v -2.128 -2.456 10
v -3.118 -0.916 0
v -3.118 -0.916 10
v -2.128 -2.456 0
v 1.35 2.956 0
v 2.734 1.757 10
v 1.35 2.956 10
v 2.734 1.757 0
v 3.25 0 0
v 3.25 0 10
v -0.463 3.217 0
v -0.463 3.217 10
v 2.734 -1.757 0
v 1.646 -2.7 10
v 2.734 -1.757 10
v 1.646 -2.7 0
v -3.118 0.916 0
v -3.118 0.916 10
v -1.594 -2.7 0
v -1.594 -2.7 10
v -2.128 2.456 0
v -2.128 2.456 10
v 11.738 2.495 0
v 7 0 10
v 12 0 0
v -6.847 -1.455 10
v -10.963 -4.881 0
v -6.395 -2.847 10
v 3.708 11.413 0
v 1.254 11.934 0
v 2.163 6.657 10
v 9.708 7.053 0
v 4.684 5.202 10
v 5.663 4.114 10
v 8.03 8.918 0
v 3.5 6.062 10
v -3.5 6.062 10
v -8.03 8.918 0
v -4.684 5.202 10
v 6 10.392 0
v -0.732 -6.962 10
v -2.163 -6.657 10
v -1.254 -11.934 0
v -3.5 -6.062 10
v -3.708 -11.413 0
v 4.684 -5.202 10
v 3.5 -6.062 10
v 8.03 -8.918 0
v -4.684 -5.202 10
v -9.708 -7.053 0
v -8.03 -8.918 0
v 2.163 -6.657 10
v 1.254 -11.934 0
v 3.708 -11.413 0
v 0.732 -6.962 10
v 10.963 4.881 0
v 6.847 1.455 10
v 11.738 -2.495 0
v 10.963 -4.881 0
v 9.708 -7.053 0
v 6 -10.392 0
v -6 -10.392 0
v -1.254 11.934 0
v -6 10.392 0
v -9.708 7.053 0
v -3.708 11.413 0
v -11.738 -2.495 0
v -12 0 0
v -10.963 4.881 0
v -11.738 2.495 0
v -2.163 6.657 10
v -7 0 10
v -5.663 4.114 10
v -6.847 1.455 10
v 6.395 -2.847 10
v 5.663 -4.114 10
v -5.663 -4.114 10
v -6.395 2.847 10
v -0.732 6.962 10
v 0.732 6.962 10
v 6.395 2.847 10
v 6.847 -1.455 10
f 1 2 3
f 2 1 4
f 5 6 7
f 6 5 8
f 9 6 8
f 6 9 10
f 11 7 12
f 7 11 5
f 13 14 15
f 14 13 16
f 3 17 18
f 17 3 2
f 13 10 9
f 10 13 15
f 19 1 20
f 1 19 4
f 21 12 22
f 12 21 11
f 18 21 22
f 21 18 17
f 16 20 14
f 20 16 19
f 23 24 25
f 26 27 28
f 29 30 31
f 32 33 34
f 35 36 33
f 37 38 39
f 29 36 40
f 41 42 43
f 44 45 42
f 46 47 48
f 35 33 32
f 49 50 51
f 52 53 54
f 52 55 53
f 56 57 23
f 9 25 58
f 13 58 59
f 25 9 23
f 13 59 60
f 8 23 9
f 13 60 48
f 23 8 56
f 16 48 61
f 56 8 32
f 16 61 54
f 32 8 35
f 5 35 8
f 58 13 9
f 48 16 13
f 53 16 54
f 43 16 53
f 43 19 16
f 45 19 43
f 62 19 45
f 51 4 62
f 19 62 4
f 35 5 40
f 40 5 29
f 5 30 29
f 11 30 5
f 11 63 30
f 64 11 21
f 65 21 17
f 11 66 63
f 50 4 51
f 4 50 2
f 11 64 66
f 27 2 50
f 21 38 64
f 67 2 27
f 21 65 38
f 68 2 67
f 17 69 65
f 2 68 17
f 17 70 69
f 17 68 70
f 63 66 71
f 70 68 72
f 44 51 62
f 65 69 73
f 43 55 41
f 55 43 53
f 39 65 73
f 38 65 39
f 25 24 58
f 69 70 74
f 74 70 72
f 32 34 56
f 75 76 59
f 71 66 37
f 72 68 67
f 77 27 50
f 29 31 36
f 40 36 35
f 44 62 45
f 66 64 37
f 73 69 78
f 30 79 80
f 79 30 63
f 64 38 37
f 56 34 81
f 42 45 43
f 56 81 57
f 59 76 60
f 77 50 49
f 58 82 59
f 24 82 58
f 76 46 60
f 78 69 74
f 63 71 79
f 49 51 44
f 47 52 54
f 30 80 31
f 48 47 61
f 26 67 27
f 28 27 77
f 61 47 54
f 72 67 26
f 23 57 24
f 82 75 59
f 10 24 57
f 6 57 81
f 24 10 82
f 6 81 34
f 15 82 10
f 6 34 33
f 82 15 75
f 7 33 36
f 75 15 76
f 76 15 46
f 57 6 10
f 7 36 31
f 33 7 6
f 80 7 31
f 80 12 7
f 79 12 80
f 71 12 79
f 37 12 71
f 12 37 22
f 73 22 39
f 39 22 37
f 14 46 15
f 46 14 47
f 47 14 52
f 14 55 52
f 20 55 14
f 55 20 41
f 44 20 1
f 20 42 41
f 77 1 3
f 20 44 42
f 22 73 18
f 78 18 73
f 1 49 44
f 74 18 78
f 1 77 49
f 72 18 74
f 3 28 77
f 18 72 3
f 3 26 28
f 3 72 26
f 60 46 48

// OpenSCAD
//FABSCAN TURN TABLE MOTOR MOUNT
//JACK TAYLOR 2016

module motorshaft(height,diam,flatdiam)
{
    rd = diam/2;
    difference()
    {
    color("blue")
    cylinder(r=rd,h=height);
    color("pink")
    translate([-rd,-rd-flatdiam,-1])
    cube([diam,diam,height+2]);
    }
}

//motorshaft(22,5,4);

difference()
{
cylinder(r1=12,r2=7,h=10);
translate([0,0,-1])
motorshaft(12,6.5,5.95);
}
